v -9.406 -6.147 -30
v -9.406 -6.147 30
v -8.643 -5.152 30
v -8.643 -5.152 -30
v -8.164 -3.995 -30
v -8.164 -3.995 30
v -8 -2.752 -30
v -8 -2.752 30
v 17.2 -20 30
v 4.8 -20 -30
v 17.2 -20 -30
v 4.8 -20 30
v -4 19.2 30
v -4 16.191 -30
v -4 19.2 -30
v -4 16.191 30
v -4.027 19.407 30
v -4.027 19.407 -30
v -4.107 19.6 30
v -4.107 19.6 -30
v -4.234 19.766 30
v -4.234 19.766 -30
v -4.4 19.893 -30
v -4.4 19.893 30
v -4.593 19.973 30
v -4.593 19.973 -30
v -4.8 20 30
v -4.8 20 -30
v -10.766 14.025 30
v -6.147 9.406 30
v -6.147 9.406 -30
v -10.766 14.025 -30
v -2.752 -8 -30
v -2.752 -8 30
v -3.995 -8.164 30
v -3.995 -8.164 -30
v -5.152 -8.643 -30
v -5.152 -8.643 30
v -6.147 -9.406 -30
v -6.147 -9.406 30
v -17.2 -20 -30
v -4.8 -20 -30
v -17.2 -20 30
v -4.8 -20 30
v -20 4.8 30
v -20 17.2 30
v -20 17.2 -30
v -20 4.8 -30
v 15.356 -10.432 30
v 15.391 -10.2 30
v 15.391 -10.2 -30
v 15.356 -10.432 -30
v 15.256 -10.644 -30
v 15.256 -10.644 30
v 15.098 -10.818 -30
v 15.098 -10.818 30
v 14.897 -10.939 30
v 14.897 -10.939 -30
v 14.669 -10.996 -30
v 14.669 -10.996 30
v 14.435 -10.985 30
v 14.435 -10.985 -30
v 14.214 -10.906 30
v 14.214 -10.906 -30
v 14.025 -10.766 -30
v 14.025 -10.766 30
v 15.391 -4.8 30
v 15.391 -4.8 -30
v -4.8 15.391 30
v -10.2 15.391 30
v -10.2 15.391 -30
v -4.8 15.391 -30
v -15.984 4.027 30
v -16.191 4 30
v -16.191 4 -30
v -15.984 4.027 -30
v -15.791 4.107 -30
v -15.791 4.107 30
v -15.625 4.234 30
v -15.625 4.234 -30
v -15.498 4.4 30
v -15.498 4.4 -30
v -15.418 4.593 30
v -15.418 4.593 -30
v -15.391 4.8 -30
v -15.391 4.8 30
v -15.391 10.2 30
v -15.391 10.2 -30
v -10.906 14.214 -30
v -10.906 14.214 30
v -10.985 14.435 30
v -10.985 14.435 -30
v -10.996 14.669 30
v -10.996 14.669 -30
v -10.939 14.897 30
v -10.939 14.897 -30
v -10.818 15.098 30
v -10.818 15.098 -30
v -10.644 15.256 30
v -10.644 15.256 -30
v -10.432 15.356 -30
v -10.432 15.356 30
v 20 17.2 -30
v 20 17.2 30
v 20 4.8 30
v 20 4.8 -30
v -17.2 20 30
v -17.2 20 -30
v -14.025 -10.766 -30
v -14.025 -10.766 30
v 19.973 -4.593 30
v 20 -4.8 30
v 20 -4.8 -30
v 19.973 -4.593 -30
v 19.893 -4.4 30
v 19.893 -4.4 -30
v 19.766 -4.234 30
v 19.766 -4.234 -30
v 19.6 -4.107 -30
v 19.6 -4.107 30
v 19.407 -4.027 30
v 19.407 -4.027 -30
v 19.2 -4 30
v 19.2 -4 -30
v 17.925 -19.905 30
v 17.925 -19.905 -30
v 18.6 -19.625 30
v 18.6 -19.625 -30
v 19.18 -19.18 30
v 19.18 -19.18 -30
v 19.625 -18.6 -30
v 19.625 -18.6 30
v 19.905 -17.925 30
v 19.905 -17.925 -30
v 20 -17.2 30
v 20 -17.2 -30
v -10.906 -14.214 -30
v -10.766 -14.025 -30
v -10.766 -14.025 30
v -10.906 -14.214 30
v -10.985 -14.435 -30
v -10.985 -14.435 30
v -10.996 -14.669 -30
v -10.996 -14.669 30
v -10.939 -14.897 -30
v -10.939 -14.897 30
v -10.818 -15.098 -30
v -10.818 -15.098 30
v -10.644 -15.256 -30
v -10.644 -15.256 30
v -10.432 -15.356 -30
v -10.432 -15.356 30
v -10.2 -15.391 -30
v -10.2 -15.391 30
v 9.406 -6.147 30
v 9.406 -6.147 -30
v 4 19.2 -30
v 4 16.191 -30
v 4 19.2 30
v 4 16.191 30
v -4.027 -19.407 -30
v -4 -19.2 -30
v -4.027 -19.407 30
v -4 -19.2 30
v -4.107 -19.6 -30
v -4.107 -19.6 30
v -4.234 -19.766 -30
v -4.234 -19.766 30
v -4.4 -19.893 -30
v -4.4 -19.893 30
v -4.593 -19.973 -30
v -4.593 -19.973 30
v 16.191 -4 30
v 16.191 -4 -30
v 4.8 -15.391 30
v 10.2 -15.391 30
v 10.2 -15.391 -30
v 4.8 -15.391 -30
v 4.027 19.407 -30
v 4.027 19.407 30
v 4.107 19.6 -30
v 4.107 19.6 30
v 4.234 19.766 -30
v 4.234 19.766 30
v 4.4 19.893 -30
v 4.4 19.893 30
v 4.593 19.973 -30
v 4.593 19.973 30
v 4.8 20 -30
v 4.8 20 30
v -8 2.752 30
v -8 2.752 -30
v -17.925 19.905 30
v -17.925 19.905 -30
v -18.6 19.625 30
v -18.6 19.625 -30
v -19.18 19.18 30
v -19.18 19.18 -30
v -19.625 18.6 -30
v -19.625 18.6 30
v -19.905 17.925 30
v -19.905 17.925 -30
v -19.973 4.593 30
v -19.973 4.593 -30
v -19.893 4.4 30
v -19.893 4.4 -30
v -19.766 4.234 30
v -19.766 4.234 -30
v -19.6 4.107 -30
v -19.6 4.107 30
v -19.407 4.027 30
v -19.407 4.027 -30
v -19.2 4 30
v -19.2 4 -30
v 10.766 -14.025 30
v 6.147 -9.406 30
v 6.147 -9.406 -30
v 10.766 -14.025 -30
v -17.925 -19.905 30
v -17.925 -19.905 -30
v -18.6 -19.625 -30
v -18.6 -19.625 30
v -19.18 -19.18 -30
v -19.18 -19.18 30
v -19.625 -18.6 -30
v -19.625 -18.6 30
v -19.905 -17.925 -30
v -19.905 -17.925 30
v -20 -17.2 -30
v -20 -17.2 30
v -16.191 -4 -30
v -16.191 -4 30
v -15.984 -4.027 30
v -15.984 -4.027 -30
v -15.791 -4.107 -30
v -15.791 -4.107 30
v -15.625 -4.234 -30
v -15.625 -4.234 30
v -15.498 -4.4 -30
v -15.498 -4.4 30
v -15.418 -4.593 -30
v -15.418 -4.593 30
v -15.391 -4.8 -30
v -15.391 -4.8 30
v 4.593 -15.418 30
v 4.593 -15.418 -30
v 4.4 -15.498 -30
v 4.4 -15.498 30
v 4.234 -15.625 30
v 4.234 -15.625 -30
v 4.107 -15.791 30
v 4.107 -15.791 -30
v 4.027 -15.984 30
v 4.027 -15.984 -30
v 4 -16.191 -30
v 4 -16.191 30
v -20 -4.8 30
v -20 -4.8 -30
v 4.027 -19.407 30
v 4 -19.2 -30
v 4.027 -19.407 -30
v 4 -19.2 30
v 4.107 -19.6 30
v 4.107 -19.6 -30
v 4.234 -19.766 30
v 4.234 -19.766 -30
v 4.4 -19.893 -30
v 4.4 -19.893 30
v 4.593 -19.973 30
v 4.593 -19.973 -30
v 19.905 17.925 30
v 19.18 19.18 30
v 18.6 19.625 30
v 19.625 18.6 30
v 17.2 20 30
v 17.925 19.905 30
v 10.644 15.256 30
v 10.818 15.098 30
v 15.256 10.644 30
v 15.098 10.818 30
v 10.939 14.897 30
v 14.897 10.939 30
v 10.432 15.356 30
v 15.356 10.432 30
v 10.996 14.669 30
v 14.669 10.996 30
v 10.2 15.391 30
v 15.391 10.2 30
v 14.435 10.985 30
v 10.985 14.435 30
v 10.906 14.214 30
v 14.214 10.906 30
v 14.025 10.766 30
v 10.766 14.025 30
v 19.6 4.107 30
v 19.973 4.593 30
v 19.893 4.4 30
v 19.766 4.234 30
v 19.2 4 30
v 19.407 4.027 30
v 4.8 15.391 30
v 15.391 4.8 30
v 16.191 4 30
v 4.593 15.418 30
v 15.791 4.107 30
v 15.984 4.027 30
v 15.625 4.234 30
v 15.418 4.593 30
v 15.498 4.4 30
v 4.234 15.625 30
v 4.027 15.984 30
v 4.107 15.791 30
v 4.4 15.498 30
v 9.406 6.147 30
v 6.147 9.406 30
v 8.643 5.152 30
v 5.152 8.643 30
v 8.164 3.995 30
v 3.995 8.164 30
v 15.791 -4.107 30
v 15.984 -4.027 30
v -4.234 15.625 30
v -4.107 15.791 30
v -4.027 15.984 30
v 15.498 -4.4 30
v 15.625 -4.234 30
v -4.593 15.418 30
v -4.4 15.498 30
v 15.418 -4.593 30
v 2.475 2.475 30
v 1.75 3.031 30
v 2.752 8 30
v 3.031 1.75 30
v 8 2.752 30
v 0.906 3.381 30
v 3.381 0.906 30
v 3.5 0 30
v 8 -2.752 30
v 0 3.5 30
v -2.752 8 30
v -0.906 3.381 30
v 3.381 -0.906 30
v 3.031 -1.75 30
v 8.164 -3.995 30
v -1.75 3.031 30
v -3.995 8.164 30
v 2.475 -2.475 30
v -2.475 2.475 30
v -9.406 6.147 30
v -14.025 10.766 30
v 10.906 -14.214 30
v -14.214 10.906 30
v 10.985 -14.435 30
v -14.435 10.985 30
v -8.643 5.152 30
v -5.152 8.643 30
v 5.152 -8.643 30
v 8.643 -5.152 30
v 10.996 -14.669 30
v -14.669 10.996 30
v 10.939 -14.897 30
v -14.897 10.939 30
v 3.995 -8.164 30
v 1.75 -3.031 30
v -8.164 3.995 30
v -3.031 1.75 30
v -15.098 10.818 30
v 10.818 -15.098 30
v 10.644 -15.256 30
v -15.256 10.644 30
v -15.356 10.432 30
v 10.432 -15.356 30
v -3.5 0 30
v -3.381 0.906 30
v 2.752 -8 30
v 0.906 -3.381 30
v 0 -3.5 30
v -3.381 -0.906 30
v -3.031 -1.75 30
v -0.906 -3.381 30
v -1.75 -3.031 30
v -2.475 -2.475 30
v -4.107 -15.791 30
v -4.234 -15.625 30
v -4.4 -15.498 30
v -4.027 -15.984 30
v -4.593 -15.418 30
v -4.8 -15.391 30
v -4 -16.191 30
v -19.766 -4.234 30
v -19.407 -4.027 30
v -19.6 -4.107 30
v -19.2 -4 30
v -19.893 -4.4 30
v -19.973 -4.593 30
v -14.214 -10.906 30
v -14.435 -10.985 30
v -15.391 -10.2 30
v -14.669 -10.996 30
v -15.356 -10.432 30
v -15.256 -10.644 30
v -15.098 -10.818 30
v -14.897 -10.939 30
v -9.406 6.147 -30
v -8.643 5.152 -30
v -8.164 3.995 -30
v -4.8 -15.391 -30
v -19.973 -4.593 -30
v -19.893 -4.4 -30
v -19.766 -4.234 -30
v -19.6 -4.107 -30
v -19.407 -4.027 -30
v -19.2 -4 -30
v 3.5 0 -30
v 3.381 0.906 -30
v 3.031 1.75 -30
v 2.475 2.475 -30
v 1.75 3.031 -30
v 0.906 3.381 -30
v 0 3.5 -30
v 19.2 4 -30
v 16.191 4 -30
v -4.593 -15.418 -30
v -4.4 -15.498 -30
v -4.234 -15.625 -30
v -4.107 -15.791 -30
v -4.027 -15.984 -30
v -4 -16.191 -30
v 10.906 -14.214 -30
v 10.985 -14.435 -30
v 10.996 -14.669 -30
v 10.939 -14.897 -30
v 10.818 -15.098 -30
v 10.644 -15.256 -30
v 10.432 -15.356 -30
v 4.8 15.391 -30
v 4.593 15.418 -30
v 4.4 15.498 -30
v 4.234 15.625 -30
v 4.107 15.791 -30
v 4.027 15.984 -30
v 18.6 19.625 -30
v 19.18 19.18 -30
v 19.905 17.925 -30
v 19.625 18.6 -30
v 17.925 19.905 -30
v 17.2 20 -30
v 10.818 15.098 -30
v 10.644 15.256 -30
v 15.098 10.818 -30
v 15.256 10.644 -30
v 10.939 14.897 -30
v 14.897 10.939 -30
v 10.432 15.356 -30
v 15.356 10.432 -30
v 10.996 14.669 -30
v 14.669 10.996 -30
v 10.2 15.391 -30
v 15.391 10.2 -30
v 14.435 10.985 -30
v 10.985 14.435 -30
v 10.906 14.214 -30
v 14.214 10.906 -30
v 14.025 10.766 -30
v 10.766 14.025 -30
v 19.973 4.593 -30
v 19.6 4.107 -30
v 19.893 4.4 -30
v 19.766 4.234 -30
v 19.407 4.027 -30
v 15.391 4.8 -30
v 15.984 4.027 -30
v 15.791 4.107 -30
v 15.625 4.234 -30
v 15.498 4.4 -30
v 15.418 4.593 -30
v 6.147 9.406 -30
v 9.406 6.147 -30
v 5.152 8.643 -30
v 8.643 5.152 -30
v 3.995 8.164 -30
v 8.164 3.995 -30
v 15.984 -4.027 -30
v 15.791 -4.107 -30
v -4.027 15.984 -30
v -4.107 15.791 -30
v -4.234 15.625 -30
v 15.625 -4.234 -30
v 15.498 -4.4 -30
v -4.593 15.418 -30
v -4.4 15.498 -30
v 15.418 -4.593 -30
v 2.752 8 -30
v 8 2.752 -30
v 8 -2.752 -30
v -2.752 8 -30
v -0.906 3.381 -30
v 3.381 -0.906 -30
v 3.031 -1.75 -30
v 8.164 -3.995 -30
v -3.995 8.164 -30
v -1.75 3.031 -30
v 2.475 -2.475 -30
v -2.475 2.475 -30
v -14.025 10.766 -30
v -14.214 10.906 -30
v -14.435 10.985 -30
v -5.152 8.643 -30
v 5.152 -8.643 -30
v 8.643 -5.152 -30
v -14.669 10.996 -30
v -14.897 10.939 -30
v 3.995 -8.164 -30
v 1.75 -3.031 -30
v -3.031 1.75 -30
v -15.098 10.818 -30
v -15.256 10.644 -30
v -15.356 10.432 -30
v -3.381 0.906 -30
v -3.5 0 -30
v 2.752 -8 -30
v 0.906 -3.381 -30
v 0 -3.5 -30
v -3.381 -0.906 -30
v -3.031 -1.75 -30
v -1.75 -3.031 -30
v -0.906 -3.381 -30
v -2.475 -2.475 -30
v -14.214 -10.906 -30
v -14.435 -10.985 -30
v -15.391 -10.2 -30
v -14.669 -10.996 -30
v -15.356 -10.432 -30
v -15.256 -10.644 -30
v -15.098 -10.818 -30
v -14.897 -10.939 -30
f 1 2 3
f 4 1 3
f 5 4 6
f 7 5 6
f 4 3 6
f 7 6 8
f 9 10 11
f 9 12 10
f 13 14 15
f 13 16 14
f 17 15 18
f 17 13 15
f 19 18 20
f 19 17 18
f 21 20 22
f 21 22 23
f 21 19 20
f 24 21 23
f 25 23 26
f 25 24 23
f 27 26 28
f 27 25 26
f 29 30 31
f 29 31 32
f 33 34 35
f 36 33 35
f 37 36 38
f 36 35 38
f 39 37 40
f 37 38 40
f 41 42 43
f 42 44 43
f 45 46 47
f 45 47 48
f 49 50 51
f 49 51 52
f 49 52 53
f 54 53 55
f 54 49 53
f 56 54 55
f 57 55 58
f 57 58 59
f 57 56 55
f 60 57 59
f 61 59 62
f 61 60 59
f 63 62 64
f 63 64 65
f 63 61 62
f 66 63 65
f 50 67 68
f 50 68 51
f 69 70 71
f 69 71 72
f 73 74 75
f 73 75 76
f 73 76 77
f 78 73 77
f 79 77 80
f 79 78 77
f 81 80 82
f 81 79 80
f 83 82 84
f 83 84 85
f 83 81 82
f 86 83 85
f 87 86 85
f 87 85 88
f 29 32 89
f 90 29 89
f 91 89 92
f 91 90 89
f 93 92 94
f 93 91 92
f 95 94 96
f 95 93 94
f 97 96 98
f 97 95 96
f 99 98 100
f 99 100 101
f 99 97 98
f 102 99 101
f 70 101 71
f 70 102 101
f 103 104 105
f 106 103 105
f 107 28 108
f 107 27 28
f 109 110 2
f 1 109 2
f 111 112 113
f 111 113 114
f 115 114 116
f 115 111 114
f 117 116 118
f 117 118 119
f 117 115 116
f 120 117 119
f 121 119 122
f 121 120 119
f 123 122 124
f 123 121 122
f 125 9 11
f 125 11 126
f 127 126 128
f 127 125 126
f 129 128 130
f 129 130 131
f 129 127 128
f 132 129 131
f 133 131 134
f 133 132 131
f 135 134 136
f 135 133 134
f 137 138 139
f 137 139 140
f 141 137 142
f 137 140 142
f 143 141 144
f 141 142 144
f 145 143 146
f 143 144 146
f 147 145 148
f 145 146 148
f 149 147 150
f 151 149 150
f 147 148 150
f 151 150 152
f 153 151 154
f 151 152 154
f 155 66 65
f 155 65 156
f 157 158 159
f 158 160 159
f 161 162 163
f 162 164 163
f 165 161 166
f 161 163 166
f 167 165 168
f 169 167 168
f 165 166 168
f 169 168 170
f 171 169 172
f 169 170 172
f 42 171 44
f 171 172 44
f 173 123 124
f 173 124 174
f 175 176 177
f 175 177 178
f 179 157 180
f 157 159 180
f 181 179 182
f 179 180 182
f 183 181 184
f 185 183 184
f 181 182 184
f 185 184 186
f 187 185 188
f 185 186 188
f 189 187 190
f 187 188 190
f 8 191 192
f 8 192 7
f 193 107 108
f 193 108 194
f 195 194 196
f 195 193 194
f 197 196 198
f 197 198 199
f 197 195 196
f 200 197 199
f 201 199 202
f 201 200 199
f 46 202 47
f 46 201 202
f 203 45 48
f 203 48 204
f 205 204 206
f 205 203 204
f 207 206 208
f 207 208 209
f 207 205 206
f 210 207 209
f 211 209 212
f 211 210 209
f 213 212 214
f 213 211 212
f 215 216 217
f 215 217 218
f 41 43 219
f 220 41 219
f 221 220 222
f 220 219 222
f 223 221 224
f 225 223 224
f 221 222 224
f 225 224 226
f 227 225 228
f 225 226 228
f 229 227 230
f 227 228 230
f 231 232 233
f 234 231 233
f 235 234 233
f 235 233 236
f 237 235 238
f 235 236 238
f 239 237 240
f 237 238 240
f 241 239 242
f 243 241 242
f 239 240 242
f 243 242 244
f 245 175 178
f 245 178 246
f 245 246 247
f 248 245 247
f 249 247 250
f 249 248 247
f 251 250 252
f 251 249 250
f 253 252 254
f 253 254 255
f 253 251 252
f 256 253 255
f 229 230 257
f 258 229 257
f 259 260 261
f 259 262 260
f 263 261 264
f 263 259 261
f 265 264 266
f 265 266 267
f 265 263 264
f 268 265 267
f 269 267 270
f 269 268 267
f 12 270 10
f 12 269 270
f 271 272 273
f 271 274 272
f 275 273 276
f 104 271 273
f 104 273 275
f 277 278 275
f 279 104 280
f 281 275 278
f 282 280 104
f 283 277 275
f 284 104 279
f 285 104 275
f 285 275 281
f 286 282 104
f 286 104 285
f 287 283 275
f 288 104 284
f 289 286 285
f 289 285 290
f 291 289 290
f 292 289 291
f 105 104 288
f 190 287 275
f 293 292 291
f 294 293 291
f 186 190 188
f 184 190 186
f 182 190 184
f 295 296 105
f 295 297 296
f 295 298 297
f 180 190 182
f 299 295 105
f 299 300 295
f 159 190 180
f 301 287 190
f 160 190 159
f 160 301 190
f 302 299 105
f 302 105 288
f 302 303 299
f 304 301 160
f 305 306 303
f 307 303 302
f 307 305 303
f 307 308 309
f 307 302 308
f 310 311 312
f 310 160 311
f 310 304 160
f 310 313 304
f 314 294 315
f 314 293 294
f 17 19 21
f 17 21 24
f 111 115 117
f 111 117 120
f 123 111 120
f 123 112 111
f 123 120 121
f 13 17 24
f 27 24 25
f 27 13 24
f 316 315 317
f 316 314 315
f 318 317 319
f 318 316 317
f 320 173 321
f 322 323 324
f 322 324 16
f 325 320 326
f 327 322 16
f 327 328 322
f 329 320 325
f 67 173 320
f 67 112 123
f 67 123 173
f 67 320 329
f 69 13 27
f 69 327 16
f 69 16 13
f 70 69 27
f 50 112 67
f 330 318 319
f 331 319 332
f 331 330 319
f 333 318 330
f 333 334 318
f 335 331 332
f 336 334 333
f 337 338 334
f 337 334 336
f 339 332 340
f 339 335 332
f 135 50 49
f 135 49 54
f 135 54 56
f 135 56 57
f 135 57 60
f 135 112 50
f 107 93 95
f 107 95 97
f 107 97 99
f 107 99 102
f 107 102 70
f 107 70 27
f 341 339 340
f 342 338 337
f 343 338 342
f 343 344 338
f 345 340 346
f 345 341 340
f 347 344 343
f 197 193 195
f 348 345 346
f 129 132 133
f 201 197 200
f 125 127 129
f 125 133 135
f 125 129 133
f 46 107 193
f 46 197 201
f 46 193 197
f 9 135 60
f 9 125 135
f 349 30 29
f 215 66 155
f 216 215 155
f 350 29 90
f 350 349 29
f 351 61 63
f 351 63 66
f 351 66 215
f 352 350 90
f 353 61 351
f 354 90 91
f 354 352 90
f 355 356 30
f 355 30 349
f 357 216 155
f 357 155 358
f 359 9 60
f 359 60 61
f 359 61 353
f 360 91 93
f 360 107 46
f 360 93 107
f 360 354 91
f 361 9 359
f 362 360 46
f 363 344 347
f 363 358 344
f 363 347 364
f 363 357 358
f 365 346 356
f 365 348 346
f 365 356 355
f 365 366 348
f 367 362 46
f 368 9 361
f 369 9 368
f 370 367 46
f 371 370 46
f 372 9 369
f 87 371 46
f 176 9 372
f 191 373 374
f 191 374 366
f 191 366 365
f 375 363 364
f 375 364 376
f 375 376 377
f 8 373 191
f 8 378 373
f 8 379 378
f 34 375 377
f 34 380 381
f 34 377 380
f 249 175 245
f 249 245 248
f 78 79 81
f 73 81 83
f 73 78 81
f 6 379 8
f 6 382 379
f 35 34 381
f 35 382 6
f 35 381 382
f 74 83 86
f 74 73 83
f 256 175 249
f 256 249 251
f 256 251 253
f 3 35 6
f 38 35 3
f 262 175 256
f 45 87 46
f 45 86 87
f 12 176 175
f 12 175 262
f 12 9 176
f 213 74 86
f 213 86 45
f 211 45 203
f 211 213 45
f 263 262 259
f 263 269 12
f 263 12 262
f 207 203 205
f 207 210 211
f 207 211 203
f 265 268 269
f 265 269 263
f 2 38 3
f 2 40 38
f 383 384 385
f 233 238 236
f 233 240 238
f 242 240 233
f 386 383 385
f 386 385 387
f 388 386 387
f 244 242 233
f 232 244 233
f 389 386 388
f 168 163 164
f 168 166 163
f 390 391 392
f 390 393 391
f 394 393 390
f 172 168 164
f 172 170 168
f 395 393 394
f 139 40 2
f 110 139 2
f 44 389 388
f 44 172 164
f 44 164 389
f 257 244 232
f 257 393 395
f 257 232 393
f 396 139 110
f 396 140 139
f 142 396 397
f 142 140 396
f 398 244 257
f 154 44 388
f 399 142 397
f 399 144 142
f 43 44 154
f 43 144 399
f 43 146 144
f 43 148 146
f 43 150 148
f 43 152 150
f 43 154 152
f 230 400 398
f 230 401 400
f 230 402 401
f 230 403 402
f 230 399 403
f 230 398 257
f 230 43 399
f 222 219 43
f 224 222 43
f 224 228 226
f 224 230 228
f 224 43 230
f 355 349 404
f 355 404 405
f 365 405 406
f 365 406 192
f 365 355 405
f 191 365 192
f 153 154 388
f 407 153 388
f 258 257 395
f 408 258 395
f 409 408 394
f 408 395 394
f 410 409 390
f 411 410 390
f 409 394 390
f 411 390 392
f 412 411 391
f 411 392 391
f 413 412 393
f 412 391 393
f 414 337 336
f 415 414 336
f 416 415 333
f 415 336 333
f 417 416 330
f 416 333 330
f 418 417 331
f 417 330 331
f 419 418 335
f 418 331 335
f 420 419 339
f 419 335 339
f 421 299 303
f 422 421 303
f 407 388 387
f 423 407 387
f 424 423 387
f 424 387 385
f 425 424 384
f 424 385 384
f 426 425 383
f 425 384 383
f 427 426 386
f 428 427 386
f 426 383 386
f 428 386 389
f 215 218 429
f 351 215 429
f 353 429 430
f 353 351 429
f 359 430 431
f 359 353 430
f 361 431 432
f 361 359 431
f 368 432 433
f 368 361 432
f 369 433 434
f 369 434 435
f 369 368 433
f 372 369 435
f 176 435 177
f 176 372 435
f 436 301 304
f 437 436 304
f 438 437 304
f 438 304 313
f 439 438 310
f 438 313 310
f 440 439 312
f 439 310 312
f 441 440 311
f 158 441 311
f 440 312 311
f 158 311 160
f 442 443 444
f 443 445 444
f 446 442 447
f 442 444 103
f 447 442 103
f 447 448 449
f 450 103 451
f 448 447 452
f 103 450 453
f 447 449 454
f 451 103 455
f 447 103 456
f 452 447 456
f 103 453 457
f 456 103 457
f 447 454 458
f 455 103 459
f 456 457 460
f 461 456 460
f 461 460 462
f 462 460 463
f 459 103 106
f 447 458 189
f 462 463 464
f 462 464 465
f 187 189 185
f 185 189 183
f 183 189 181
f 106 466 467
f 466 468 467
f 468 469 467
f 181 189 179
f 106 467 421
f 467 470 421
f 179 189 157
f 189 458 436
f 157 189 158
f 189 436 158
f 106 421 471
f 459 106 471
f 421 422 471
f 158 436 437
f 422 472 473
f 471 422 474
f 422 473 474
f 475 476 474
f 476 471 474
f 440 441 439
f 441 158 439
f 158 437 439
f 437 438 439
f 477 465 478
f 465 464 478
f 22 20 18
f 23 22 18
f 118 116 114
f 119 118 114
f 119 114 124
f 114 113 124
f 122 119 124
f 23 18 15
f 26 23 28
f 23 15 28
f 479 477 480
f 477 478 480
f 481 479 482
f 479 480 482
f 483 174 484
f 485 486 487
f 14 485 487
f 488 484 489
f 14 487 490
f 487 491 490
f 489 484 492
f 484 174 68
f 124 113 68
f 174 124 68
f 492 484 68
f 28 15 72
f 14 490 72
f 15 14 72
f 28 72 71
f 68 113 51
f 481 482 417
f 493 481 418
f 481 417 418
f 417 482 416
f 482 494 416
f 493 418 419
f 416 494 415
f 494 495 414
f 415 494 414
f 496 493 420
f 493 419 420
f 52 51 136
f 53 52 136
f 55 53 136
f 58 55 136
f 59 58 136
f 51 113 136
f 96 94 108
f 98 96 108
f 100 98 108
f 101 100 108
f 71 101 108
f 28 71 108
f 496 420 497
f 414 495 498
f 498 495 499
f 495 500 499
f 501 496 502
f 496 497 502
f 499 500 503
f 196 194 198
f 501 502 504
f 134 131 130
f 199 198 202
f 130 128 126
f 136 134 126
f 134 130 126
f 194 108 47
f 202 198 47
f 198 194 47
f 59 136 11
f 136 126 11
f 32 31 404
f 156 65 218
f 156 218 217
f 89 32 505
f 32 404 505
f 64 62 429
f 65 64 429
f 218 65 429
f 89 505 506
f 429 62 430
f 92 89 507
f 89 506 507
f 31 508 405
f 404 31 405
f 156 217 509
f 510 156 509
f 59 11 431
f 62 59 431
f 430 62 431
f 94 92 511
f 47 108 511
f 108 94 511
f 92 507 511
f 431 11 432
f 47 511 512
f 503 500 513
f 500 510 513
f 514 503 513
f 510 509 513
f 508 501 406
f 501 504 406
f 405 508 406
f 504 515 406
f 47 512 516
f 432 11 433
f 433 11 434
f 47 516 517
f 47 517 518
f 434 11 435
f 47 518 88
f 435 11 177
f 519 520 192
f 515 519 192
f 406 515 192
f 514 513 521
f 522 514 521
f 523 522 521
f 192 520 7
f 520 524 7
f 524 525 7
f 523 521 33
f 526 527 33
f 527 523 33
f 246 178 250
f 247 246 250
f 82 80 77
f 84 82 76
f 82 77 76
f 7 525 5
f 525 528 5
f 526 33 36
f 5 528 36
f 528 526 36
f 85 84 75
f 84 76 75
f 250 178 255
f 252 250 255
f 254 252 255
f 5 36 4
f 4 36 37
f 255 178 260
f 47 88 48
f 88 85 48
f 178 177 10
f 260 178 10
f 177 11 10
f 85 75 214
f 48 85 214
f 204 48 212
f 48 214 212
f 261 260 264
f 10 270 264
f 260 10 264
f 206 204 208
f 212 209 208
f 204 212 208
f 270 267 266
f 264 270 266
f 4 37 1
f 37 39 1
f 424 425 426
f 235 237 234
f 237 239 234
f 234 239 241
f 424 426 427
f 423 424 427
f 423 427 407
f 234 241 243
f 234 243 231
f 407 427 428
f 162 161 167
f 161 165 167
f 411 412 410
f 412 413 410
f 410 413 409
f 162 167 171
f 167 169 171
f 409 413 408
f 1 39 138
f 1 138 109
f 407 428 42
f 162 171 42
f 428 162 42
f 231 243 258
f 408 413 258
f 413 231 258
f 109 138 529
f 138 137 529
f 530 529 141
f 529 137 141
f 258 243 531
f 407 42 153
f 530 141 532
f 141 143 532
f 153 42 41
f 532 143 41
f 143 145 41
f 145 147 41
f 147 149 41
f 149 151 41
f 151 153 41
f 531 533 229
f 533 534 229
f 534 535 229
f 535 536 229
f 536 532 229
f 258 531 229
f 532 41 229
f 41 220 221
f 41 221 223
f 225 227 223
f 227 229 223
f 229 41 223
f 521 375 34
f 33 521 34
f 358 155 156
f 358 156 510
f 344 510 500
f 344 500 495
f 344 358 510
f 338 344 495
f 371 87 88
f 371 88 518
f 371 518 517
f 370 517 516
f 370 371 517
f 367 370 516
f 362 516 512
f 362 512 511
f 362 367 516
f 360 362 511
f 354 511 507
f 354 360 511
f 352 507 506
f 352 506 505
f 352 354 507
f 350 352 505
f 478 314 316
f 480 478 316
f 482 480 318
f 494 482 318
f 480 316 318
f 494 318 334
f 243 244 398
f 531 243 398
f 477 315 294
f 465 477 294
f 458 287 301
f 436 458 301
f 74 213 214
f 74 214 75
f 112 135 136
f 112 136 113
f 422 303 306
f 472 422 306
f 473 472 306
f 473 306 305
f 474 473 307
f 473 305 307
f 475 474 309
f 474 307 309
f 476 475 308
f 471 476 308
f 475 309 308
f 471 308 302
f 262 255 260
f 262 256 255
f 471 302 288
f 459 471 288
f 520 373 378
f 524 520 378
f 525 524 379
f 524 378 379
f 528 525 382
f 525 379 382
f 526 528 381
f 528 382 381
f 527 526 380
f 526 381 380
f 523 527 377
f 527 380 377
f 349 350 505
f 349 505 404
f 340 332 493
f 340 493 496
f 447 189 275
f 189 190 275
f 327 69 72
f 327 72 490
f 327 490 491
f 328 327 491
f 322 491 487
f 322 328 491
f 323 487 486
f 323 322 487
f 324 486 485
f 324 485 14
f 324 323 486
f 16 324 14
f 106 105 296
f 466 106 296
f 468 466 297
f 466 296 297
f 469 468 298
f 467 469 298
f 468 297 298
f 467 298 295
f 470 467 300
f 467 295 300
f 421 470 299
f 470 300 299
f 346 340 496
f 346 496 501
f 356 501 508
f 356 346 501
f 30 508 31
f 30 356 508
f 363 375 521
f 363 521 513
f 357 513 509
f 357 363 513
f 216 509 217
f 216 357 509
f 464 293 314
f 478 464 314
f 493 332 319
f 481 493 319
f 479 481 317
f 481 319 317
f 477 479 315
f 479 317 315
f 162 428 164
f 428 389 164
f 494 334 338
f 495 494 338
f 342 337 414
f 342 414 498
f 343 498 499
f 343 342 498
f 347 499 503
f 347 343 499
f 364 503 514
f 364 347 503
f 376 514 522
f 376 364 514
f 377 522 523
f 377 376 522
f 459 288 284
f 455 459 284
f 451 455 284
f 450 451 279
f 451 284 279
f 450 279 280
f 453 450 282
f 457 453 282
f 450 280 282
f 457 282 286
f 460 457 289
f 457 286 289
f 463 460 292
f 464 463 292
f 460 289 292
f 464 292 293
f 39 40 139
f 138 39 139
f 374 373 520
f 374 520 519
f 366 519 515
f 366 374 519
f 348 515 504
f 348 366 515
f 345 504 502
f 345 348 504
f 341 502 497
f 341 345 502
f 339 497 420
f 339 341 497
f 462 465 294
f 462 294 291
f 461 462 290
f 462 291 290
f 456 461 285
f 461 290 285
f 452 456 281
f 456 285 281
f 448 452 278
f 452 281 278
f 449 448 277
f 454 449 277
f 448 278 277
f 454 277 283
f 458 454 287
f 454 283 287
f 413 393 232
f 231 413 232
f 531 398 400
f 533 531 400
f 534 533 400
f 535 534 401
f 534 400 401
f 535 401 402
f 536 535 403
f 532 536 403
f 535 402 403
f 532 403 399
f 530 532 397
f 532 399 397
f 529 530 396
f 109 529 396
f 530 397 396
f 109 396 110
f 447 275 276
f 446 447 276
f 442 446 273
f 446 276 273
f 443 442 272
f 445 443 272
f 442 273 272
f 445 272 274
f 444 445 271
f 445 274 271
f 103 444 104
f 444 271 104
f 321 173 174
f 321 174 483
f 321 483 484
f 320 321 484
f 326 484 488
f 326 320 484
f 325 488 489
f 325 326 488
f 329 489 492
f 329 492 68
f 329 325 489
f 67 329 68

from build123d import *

# Parameters (mm, degrees)
BOSS_EXTRUDE1_DEPTH = 30


with BuildPart() as part:
    # Sketch4 → Boss-Extrude1 (new body, symmetric)
    with BuildSketch(Plane.XY):
        with BuildLine():
            Line((4.8, -20), (17.2, -20))
            ThreePointArc((17.2, -20), (19.179898987, -19.179898987), (20, -17.2))
            Line((20, -17.2), (20, -4.8))
            ThreePointArc((20, -4.8), (19.765685425, -4.234314575), (19.2, -4))
            Line((19.2, -4), (16.190663761, -4))
            ThreePointArc((16.190663761, -4), (15.624978336, -4.234314575), (15.390663761, -4.8))
            Line((15.390663761, -4.8), (15.390663761, -10.2))
            ThreePointArc((15.390663761, -10.2), (14.896810507, -10.939103626), (14.024978336, -10.765685425))
            Line((14.024978336, -10.765685425), (9.40588745, -6.146594539))
            ThreePointArc((9.40588745, -6.146594539), (8.365378244, -4.589362465), (8, -2.752481989))
            Line((8, -2.752481989), (8, 0))
            Line((8, 0), (3.5, 0))
            ThreePointArc((3.5, 0), (2.474873734, -2.474873734), (0, -3.5))
            Line((0, -3.5), (0, -8))
            Line((0, -8), (2.752481989, -8))
            ThreePointArc((2.752481989, -8), (4.589362465, -8.365378244), (6.146594539, -9.40588745))
            Line((6.146594539, -9.40588745), (10.765685425, -14.024978336))
            ThreePointArc((10.765685425, -14.024978336), (10.939103626, -14.896810507), (10.2, -15.390663761))
            Line((10.2, -15.390663761), (4.8, -15.390663761))
            ThreePointArc((4.8, -15.390663761), (4.234314575, -15.624978336), (4, -16.190663761))
            Line((4, -16.190663761), (4, -19.2))
            ThreePointArc((4, -19.2), (4.234314575, -19.765685425), (4.8, -20))
        make_face()
    extrude(amount=BOSS_EXTRUDE1_DEPTH, both=True)

    # Mirror1: part across plane


with BuildPart() as part_1:
    add(part.part)
    add(part.part.mirror(Plane(origin=(0, 0, 0), x_dir=(0, 0, 1), z_dir=(1, 0, 0))))

    # Mirror2: part across plane


with BuildPart() as part_2:
    add(part_1.part)
    add(part_1.part.mirror(Plane.ZX))


solid = part_2.part
